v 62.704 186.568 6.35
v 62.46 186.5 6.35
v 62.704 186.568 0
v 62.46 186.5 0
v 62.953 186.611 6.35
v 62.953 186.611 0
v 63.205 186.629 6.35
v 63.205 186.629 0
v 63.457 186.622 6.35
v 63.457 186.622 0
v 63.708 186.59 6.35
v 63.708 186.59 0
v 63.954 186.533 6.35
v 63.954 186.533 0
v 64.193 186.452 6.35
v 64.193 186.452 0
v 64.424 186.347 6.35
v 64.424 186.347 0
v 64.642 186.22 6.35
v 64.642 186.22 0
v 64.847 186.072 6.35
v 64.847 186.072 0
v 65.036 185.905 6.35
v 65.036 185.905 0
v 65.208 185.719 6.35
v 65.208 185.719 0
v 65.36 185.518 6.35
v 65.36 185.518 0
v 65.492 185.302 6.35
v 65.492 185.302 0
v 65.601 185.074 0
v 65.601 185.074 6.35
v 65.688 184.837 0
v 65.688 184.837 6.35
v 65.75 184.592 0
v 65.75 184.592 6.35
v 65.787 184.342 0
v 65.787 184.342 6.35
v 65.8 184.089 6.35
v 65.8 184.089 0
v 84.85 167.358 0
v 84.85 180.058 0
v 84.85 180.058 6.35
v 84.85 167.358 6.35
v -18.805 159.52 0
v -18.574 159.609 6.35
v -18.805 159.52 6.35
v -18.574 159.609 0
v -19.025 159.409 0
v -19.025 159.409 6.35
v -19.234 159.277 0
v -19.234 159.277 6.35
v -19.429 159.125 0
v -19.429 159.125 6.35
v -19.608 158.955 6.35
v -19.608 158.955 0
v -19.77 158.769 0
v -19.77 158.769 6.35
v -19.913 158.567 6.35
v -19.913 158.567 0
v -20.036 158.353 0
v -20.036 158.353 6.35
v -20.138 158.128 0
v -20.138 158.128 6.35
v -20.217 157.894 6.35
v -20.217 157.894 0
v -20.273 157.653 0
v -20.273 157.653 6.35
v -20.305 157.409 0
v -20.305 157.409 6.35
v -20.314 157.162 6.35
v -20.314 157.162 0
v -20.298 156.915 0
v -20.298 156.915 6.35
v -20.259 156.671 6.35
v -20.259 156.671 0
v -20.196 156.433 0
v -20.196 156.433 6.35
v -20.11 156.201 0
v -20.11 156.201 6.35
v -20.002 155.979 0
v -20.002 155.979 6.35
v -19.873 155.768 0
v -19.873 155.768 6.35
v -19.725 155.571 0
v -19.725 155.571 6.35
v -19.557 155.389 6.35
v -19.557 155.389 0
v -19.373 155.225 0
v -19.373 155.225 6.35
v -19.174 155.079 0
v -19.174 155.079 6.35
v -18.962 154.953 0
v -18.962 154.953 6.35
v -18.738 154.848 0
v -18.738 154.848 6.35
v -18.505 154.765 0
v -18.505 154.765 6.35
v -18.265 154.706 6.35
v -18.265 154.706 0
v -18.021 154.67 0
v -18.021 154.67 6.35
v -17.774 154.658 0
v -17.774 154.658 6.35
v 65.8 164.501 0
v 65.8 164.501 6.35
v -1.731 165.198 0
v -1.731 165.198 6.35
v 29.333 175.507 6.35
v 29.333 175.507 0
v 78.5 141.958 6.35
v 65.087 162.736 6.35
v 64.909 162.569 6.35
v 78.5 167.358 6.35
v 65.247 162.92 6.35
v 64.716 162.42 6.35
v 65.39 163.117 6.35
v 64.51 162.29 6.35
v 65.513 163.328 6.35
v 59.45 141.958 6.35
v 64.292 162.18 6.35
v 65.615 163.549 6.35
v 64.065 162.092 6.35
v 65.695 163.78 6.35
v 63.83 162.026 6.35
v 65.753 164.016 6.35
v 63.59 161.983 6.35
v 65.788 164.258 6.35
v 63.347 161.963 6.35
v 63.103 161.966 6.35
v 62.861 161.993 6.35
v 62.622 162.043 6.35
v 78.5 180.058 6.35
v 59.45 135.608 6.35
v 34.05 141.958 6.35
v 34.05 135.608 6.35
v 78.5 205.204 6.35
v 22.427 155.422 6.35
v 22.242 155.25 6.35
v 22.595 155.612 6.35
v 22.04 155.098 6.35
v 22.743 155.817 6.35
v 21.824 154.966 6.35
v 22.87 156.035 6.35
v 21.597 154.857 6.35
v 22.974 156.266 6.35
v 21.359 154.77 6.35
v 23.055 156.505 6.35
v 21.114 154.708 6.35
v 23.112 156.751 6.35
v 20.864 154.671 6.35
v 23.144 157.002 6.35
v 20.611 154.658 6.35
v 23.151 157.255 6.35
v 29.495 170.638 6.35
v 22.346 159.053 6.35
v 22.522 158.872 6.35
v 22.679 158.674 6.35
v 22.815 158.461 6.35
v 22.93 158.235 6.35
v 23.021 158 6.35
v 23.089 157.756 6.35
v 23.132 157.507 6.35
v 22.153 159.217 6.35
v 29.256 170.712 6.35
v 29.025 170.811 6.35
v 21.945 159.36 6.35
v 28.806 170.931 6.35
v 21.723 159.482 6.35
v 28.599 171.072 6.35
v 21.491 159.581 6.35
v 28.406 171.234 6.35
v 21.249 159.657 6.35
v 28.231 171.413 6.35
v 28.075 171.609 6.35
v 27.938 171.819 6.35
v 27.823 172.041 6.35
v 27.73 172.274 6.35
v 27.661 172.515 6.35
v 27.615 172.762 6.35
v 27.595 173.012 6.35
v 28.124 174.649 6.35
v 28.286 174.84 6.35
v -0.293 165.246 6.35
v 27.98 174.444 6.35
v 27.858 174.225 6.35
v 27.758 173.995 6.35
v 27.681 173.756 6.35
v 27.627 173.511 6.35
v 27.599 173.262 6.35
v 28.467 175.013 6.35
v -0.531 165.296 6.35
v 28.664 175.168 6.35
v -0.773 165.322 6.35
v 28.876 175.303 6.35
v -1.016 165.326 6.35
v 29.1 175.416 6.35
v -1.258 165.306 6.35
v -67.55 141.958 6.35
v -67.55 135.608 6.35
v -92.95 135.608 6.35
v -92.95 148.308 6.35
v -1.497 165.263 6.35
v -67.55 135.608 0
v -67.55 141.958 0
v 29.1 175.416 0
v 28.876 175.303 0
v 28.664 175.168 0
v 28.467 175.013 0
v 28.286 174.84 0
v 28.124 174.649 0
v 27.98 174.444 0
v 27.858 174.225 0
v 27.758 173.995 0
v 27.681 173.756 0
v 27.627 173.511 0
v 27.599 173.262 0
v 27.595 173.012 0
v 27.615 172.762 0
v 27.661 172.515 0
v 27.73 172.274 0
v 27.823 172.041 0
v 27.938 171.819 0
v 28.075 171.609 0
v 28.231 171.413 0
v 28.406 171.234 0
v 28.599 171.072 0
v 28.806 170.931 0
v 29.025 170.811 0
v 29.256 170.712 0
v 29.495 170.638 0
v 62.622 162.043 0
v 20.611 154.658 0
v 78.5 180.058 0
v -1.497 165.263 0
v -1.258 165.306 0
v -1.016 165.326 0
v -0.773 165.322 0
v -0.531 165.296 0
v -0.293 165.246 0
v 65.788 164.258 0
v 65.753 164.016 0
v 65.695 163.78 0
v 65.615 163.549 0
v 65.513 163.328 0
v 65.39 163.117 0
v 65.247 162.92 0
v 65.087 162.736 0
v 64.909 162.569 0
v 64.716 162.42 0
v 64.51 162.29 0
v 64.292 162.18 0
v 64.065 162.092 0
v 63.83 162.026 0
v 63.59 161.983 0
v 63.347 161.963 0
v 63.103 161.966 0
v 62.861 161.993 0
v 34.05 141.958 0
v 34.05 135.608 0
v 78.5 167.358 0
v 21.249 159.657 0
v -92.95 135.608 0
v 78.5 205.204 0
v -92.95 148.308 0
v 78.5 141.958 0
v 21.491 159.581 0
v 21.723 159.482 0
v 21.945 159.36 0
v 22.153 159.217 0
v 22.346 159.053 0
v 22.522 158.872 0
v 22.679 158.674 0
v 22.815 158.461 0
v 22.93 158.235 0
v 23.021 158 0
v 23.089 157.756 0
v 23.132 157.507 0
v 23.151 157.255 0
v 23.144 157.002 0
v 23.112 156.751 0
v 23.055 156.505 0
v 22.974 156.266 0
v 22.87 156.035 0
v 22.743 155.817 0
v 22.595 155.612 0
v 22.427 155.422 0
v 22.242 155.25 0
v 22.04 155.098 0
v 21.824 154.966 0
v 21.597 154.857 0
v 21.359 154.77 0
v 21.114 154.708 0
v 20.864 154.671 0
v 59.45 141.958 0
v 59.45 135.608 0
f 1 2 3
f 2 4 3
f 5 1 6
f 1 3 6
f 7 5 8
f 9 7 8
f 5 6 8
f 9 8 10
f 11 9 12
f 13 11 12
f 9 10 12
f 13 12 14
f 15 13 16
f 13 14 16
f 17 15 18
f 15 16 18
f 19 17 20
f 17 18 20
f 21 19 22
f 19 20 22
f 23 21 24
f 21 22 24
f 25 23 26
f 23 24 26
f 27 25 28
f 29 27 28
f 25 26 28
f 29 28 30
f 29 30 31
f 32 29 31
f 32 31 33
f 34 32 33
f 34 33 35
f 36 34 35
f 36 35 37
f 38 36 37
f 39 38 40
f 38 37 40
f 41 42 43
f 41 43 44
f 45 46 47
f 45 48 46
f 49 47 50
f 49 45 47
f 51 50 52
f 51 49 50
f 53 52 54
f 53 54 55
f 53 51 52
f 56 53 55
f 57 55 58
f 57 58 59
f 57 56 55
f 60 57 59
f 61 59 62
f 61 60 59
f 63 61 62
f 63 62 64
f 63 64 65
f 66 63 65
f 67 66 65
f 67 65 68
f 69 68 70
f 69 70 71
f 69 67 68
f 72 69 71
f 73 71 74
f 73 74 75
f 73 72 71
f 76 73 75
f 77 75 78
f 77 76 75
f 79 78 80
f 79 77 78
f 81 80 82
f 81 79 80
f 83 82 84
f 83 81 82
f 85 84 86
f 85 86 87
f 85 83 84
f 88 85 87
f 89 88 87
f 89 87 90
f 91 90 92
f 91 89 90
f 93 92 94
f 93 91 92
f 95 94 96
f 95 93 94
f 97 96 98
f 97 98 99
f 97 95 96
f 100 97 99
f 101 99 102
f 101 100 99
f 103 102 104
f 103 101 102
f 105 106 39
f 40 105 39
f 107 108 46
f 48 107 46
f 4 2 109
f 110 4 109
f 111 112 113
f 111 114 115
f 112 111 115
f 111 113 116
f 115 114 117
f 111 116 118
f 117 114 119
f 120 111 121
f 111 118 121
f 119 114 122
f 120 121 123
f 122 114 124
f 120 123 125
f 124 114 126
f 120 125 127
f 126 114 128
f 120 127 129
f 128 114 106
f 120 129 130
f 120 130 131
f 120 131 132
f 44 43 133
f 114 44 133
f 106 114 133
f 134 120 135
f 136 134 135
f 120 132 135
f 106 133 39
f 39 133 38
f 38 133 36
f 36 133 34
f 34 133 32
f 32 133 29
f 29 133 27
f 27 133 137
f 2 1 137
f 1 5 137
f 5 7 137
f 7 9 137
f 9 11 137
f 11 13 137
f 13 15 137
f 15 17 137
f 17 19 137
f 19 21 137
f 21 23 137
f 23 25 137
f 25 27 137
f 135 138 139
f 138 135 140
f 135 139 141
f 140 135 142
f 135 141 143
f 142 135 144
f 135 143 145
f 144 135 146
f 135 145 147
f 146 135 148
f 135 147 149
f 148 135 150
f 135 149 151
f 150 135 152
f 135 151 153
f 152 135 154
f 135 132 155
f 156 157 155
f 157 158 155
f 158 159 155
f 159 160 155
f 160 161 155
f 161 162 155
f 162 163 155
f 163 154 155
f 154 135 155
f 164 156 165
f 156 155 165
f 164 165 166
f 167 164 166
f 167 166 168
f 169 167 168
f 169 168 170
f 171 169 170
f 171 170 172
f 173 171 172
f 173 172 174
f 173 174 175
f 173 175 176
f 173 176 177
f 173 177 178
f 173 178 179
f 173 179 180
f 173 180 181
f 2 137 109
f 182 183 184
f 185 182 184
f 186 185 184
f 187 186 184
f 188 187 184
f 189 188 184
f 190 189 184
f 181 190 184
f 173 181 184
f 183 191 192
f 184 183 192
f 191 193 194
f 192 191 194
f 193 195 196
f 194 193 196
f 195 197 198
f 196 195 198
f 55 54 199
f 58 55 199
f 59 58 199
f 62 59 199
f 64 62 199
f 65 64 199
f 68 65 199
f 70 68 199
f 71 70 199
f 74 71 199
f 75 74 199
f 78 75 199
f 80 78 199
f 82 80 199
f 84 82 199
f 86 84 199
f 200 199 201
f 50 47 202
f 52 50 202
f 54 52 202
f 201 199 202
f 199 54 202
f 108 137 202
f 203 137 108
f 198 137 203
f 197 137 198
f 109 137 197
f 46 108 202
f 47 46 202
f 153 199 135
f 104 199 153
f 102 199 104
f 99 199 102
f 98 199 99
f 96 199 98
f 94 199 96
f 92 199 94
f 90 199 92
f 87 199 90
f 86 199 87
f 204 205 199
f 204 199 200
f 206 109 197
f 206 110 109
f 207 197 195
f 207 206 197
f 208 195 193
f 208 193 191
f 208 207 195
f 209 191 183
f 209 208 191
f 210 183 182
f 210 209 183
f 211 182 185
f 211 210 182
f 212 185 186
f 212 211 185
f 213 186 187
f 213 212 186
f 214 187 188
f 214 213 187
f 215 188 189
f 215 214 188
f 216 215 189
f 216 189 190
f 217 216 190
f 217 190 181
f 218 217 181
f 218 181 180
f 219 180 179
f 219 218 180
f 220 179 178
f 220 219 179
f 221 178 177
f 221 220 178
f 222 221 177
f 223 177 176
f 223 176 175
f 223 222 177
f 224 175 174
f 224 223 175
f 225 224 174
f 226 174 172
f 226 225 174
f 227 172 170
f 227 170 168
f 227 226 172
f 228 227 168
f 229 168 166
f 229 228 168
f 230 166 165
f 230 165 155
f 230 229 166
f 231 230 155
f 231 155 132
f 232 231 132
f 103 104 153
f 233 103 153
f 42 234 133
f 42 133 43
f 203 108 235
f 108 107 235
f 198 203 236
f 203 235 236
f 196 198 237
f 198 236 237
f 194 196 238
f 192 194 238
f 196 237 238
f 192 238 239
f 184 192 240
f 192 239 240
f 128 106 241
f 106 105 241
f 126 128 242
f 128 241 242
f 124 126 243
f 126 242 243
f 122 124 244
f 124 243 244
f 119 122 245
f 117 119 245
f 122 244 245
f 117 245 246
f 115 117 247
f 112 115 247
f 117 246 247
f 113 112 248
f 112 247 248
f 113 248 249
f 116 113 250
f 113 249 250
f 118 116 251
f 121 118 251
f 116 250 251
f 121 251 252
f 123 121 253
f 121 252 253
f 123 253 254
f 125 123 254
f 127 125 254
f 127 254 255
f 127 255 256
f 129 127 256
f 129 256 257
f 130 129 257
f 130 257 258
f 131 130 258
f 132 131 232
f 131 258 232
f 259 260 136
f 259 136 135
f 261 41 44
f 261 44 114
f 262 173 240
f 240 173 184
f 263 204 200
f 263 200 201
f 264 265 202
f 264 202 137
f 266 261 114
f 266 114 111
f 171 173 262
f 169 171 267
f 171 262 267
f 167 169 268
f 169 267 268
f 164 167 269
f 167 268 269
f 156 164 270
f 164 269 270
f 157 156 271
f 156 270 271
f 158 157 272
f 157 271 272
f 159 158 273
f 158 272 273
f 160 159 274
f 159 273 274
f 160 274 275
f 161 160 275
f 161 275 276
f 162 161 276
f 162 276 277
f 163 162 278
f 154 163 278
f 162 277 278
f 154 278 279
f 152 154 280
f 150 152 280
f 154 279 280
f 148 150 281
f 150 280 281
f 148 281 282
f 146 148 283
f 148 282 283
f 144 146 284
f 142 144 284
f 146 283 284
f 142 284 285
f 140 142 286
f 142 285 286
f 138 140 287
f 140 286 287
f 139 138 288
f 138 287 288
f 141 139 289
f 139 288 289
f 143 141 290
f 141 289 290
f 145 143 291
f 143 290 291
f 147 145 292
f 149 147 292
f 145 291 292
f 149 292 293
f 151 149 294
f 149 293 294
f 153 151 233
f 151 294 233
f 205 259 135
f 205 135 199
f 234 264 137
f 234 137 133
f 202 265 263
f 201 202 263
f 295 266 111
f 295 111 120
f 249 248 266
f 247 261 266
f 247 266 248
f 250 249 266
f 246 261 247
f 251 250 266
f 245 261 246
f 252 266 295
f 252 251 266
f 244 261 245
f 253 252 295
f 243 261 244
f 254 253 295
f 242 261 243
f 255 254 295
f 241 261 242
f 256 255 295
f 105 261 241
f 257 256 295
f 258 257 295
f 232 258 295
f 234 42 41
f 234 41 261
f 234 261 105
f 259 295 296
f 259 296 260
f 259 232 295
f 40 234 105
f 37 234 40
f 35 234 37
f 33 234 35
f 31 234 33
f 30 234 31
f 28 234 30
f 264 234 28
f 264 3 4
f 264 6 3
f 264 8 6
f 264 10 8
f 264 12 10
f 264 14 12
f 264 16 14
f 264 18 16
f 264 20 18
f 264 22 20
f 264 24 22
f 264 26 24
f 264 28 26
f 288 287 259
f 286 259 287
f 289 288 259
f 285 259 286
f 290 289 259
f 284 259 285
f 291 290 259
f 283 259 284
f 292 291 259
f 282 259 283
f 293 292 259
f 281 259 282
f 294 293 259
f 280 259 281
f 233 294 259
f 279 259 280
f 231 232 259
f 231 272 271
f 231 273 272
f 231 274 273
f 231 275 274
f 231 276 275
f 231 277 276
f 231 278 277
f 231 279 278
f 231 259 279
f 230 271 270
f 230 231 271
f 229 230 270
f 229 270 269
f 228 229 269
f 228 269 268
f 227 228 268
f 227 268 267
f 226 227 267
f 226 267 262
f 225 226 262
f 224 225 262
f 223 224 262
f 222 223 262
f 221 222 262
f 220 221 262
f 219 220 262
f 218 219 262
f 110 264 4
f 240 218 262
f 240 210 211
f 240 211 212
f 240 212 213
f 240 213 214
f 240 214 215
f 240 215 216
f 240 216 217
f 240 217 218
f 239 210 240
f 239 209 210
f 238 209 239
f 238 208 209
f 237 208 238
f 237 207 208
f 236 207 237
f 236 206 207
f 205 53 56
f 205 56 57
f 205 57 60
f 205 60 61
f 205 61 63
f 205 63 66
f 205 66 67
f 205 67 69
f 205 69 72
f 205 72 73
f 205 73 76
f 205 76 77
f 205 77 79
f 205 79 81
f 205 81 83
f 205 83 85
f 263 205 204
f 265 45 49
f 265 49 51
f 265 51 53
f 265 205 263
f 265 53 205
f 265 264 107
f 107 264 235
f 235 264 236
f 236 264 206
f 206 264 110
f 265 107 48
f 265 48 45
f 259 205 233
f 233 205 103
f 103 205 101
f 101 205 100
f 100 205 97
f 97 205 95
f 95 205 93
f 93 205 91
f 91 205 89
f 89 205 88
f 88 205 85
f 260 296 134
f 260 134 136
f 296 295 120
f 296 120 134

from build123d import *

# Parameters (mm, degrees)
BOSS_EXTRUDE1_DEPTH = 6.35
CUT_EXTRUDE1_DEPTH  = 226.36350526
FILLET1_R           = 2.54


with BuildPart() as part:
    # Sketch2 → Boss-Extrude1 (new body)
    with BuildSketch(Plane.XY):
        Polygon((-92.950015109, 148.30800019), (78.499984891, 205.20400019), (78.499984891, 180.05800019), (84.849984891, 180.05800019), (84.849984891, 167.35800019), (78.499984891, 167.35800019), (78.499984891, 141.95800019), (59.449984891, 141.95800019), (59.449984891, 135.60800019), (34.049984891, 135.60800019), (34.049984891, 141.95800019), (-67.550015109, 141.95800019), (-67.550015109, 135.60800019), (-92.950015109, 135.60800019), (-92.950015109, 141.95800019), align=None)
    extrude(amount=BOSS_EXTRUDE1_DEPTH)

    # Sketch3 → Cut-Extrude1 (cut, through all)
    with BuildSketch(Plane.XY.offset(6.35)):
        Polygon((-1.019446214, 165.434292154), (-33.492647443, 154.65800019), (40.515121465, 154.65800019), align=None)
        Polygon((65.799984891, 187.608444106), (21.169587996, 172.797764247), (65.799984891, 161.218248334), align=None)
    extrude(amount=-CUT_EXTRUDE1_DEPTH, mode=Mode.SUBTRACT)

    # Fillet1
    fillet1_edges = [part.edges().sort_by_distance(p)[0] for p in [
        (65.799984891, 161.218248334, 3.175),
        (21.169587996, 172.797764247, 3.175),
        (65.799984891, 187.608444106, 3.175),
        (40.515121465, 154.65800019, 3.175),
        (-33.492647443, 154.65800019, 3.175),
        (-1.019446214, 165.434292154, 3.175),
    ]]
    fillet(fillet1_edges, radius=FILLET1_R)


solid = part.part
